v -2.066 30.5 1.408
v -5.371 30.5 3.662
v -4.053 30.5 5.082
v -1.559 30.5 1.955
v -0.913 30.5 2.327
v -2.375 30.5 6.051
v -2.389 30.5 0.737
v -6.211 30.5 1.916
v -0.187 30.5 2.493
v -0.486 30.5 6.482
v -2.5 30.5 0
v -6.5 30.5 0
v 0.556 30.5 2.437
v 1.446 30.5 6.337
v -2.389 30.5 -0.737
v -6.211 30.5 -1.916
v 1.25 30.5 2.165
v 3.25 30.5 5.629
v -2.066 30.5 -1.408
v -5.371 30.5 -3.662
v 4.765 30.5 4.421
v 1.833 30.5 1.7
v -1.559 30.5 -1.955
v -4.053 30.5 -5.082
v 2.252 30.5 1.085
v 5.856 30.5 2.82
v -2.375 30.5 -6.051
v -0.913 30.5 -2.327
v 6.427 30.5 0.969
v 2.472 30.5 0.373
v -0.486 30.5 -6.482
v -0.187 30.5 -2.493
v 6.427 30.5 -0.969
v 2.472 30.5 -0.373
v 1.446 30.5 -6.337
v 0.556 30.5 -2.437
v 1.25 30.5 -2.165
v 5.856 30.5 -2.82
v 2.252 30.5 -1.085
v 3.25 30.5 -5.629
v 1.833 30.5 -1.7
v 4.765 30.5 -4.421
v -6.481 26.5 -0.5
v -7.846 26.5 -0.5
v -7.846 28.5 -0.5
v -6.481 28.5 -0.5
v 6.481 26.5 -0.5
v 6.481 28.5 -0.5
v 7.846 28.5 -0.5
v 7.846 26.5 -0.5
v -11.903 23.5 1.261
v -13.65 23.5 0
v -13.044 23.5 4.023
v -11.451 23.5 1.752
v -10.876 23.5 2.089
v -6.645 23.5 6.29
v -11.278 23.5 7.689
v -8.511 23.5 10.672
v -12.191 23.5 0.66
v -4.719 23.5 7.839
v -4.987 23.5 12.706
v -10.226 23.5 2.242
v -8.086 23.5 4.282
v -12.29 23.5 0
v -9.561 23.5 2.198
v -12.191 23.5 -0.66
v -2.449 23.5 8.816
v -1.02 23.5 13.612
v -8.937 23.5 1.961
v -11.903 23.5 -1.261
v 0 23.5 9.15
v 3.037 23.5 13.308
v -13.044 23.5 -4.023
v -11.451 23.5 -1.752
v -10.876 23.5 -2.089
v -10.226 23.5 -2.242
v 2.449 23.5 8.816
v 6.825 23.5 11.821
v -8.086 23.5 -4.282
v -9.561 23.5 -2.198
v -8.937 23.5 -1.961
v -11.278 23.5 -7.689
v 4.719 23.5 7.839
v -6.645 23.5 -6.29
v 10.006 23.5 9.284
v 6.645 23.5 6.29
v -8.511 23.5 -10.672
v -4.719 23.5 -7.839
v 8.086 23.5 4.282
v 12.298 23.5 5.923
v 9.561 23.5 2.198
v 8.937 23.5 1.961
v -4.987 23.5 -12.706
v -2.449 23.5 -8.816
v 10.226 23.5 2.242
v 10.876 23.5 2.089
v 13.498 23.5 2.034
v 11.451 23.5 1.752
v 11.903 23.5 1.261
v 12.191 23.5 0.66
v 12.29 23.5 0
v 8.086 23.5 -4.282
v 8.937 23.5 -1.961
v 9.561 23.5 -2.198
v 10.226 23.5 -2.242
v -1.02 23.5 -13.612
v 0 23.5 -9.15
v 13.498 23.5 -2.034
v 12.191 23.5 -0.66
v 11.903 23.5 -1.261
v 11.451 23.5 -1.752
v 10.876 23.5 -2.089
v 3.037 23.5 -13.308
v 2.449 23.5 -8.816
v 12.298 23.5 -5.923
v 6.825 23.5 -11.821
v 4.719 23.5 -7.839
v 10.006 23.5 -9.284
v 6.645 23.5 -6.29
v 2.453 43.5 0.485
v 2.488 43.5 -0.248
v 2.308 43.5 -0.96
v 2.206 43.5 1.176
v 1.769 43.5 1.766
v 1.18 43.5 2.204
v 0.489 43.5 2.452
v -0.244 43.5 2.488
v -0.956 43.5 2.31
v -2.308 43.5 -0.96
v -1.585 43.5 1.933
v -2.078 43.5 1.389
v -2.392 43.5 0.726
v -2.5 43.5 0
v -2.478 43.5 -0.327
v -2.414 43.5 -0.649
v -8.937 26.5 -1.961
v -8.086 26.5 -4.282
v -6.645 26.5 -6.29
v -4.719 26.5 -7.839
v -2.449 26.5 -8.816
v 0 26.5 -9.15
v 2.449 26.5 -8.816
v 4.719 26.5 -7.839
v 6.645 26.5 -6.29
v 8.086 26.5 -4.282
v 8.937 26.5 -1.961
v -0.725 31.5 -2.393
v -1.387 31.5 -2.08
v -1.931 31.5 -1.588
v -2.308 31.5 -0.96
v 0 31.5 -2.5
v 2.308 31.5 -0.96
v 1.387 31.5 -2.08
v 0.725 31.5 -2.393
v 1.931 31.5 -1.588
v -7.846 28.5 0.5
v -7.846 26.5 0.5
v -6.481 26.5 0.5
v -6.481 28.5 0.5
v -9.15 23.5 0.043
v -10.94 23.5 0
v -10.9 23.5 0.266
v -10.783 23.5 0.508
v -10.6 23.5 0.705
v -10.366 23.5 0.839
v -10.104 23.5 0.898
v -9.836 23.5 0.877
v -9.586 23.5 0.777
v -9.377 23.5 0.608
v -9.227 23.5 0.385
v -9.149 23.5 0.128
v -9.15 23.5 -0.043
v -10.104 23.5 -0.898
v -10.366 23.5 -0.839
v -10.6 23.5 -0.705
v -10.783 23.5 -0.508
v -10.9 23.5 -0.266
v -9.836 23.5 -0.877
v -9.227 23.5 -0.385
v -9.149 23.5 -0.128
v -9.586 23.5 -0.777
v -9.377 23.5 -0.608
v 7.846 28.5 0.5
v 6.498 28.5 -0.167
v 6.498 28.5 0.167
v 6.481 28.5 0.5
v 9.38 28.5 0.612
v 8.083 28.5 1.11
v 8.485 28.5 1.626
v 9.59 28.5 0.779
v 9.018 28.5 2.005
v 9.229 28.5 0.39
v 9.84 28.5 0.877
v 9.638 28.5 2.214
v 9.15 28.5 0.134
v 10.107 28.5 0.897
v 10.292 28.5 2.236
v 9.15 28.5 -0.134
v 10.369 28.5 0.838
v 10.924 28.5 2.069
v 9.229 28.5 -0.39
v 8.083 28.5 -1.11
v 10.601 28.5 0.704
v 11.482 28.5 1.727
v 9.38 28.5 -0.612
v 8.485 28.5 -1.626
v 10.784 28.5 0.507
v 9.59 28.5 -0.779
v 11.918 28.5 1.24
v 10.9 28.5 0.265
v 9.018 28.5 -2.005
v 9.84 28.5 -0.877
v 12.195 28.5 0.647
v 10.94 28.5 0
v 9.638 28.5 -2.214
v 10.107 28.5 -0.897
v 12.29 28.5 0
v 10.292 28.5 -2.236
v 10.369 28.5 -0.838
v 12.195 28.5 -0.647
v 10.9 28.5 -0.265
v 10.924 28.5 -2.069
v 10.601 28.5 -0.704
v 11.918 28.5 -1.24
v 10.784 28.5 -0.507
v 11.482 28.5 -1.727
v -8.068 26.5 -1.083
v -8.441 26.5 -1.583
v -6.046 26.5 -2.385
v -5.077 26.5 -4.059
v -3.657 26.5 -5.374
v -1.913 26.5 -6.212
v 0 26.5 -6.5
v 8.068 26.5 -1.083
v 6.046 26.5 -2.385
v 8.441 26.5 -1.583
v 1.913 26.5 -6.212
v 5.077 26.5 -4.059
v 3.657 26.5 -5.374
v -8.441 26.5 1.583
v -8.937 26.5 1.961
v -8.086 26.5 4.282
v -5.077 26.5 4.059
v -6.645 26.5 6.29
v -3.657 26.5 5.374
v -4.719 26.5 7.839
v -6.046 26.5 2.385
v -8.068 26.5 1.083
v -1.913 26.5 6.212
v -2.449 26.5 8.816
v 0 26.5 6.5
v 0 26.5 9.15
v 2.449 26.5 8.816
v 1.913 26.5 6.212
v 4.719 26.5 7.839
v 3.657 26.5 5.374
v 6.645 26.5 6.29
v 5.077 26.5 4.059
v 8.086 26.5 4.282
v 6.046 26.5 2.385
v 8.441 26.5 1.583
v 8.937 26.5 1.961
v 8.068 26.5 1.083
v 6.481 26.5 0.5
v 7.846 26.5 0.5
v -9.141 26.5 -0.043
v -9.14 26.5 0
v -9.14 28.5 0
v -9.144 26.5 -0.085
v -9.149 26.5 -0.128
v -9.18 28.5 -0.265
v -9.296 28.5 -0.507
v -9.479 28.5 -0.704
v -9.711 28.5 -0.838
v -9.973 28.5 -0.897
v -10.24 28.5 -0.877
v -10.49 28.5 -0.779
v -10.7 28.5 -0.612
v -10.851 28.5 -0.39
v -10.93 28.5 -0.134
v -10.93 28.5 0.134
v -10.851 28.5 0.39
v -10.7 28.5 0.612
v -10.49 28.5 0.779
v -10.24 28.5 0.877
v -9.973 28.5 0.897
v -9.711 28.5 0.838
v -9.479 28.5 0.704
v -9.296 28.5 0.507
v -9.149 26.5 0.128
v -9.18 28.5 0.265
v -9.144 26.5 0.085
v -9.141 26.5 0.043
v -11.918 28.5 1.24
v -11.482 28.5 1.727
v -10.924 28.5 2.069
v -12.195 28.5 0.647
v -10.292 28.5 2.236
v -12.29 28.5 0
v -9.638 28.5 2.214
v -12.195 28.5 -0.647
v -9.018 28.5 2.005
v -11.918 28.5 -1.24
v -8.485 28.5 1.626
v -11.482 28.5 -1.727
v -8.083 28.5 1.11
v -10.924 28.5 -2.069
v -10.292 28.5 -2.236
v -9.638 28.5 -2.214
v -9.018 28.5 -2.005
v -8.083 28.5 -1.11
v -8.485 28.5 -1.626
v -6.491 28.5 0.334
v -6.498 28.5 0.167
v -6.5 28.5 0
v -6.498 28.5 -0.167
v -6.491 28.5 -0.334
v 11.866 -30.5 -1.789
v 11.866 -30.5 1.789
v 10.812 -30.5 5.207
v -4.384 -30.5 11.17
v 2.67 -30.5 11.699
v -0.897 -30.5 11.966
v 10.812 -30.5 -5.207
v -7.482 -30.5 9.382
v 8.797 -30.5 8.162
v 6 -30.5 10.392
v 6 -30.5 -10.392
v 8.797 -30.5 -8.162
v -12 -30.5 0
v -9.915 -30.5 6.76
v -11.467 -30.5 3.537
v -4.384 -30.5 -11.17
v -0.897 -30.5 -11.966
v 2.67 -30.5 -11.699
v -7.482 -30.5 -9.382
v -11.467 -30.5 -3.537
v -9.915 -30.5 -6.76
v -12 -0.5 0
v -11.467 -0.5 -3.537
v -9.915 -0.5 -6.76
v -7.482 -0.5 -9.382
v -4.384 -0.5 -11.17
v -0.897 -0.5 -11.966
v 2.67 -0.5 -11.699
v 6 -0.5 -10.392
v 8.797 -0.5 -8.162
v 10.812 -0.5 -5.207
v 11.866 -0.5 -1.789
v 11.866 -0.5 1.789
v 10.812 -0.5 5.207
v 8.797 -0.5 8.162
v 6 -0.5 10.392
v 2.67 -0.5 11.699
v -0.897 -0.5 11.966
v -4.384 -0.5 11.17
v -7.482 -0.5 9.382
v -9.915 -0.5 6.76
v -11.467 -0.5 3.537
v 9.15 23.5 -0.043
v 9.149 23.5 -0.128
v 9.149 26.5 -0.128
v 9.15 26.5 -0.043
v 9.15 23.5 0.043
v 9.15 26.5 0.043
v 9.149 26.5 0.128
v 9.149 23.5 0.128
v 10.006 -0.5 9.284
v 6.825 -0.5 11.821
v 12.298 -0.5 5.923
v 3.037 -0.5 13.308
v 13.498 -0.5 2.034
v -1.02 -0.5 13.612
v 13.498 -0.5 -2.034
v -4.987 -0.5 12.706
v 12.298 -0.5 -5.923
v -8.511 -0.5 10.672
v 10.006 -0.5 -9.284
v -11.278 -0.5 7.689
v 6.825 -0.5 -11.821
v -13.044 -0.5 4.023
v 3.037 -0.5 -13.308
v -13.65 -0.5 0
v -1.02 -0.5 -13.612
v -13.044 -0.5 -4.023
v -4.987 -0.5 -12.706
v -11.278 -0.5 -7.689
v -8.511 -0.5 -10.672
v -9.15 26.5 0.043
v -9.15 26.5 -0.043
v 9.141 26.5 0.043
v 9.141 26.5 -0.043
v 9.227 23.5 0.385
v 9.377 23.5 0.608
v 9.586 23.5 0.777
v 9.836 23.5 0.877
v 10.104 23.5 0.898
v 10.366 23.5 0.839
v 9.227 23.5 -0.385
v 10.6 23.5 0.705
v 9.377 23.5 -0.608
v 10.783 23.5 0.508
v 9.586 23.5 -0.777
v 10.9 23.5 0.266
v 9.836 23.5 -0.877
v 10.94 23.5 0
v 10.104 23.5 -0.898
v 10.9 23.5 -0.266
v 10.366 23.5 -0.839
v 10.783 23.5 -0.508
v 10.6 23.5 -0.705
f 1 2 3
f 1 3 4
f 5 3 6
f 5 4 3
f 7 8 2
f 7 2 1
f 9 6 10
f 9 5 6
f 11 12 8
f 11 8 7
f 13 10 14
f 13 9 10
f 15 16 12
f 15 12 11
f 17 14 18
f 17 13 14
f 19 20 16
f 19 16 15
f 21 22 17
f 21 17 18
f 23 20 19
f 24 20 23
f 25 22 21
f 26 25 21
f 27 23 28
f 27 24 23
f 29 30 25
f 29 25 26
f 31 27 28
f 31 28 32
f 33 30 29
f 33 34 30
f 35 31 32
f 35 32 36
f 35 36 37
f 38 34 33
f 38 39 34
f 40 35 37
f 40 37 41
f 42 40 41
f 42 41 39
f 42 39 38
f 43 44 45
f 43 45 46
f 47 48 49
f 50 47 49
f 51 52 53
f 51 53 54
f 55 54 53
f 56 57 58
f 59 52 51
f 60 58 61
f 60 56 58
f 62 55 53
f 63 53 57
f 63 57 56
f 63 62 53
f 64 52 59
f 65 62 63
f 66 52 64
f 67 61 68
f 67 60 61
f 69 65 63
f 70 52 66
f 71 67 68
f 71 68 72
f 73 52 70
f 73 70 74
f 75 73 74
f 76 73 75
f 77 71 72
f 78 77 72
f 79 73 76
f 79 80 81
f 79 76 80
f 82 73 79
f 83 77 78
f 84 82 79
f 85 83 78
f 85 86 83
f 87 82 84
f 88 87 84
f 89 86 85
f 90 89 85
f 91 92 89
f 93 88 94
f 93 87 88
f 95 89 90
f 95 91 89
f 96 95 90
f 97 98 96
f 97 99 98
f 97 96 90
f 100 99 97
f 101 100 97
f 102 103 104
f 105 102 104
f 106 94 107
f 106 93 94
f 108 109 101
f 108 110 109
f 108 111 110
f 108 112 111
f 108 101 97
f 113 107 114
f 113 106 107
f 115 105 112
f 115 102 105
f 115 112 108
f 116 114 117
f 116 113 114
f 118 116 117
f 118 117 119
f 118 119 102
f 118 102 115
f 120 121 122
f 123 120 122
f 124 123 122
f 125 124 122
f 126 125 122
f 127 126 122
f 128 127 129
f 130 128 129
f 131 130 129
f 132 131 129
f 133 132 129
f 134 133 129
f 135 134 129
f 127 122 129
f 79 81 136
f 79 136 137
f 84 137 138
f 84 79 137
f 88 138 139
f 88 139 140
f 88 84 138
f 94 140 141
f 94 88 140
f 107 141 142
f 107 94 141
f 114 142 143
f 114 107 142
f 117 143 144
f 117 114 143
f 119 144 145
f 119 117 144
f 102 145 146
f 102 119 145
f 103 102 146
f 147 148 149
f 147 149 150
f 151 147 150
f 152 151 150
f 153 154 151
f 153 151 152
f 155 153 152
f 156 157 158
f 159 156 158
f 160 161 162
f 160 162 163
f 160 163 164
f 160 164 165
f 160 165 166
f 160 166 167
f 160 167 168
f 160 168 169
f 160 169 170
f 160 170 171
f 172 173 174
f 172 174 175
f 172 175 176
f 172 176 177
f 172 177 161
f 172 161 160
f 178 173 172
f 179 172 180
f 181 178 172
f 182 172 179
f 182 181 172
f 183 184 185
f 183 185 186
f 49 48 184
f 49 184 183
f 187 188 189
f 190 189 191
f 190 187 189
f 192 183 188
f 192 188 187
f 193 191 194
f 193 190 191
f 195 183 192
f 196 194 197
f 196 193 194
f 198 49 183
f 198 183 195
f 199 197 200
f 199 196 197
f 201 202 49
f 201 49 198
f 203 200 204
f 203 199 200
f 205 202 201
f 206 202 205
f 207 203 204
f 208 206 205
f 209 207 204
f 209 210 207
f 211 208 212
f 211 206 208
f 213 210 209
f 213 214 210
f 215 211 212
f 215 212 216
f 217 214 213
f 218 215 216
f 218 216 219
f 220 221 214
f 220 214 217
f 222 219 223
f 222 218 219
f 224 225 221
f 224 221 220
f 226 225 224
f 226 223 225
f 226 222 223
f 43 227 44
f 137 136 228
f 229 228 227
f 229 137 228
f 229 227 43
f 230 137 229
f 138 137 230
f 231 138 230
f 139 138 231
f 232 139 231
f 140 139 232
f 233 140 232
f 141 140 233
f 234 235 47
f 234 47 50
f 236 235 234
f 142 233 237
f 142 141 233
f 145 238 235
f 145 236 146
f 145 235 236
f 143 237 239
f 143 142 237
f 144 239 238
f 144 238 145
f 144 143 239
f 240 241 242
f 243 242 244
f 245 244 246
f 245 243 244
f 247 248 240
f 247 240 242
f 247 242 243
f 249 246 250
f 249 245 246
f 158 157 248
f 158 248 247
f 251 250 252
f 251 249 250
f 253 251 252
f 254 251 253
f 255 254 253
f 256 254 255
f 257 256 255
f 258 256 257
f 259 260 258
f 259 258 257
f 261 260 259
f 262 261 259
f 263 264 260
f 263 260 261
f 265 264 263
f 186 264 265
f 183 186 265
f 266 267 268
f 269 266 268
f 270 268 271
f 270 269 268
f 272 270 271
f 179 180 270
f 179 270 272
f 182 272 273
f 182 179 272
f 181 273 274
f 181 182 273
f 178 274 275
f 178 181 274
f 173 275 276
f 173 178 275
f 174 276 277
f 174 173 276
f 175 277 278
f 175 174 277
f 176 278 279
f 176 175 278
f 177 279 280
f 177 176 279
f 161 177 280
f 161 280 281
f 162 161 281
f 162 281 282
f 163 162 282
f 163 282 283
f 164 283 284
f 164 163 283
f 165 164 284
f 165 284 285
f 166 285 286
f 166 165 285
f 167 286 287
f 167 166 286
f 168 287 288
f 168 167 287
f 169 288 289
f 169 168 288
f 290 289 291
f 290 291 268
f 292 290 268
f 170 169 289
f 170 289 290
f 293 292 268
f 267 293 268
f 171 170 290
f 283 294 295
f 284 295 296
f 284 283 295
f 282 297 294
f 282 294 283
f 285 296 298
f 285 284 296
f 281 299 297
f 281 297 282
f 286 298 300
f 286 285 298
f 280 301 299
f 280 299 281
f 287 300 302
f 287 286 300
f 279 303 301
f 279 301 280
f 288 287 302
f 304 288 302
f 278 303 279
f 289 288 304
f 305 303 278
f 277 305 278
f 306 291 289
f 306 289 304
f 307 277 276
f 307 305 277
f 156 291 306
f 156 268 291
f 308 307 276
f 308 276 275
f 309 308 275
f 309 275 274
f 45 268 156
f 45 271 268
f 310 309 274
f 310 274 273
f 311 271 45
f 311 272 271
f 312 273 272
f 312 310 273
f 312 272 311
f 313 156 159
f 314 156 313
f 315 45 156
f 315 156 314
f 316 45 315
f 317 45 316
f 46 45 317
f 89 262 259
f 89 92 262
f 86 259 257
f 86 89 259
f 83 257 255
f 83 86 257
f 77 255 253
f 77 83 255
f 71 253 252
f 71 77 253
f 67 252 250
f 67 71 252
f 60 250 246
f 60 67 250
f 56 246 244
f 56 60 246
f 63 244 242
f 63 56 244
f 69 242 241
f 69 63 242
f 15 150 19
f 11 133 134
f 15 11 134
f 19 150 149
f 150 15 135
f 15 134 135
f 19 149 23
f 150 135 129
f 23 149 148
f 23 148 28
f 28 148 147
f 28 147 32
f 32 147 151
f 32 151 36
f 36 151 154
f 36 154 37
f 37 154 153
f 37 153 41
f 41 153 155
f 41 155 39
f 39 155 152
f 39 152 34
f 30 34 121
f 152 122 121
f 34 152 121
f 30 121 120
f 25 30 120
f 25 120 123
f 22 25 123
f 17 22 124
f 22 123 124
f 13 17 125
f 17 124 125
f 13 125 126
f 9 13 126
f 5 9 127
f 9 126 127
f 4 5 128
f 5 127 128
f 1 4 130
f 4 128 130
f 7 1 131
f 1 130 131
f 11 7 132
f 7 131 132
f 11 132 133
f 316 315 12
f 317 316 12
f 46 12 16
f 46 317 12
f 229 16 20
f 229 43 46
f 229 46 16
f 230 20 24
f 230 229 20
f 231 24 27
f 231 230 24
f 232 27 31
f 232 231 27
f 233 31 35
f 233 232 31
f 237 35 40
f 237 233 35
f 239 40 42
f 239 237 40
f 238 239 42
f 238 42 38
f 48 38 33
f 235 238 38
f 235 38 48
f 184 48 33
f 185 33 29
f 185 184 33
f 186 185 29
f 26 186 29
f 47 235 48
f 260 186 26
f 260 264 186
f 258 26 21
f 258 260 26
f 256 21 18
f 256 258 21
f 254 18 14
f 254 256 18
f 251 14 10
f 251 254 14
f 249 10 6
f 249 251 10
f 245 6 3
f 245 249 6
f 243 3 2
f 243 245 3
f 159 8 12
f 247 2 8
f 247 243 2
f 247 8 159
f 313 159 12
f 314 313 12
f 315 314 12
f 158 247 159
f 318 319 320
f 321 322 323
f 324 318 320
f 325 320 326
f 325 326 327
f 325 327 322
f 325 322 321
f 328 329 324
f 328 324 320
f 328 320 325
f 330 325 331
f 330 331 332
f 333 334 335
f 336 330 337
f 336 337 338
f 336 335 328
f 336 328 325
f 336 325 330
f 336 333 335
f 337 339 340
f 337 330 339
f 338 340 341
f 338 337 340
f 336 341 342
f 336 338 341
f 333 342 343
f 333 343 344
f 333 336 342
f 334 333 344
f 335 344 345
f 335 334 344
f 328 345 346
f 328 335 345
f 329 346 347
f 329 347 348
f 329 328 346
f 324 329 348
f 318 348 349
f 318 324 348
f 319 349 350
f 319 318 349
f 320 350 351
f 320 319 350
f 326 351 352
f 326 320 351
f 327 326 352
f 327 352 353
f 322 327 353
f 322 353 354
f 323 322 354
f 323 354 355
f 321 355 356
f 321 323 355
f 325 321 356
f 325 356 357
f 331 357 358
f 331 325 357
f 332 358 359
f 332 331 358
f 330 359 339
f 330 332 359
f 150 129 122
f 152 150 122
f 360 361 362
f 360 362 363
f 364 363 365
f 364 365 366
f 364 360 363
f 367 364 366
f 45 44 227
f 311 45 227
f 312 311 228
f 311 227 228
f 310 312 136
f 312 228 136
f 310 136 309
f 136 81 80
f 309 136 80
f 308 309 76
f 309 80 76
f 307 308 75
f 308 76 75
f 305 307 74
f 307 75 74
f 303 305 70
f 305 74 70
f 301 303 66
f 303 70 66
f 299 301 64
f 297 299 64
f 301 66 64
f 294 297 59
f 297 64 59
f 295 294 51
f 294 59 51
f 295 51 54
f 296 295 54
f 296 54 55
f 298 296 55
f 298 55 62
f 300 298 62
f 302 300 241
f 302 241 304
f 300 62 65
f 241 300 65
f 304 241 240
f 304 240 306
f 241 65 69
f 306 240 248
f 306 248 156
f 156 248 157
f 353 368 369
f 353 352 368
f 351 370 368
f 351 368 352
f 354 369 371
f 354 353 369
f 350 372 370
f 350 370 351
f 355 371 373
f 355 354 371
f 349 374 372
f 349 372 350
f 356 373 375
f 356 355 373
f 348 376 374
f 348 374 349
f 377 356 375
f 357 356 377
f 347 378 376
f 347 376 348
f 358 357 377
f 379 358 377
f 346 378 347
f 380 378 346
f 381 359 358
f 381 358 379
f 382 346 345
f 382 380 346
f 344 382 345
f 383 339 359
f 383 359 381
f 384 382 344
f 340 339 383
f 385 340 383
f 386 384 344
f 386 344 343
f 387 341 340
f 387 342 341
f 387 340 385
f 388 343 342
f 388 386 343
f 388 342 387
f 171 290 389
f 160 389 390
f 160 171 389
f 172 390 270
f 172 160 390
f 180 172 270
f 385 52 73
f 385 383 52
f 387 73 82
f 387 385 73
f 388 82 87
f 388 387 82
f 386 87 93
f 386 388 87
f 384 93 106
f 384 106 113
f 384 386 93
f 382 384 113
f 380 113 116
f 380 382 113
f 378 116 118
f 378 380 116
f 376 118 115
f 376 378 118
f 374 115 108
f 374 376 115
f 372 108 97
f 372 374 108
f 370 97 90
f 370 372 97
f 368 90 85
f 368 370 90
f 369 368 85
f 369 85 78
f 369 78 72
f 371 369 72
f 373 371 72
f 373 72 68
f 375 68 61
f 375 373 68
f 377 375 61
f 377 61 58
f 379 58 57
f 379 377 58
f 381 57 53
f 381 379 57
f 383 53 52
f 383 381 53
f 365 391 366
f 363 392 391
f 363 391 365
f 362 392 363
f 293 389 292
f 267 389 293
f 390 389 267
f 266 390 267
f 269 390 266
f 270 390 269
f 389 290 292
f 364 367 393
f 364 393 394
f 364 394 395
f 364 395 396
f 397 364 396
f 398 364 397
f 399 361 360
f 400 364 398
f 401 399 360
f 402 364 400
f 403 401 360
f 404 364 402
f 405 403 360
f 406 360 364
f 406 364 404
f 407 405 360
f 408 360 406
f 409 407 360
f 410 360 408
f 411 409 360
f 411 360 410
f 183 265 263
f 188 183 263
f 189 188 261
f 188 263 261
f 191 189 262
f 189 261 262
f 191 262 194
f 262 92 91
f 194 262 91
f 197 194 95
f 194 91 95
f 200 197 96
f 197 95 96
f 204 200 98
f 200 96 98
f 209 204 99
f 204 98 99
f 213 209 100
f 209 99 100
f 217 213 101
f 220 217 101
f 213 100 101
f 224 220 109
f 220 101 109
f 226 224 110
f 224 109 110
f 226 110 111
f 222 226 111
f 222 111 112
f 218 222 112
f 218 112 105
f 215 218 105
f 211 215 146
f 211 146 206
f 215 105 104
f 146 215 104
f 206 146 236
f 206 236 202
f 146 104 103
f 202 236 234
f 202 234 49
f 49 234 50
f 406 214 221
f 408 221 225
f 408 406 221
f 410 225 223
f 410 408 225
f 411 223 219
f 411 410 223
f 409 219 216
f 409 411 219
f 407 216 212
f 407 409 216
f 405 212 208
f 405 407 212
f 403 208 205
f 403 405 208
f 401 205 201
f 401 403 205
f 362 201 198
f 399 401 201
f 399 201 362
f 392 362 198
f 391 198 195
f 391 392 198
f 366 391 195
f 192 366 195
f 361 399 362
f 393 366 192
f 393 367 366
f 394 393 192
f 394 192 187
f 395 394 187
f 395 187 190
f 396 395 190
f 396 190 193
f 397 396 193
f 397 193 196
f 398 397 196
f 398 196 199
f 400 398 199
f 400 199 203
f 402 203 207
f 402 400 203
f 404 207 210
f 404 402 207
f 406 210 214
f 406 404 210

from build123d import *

# Parameters (mm, degrees)
CROQUIS1_W              = 2.5
CROQUIS1_H              = 13
CORTAR_EXTRUIR1_DEPTH   = 12
CROQUIS4_R              = 2.25
CROQUIS4_R_2            = 0.9
CROQUIS4_W              = 18
CROQUIS4_H              = 1
SALIENTE_EXTRUIR1_DEPTH = 5


with BuildPart() as part:
    # Croquis1 → Revolución1 (revolve)
    with BuildSketch(Plane.XY):
        with Locations((-1.25, 37)):
            Rectangle(CROQUIS1_W, CROQUIS1_H)
        Polygon((-12, -30.5), (0, -30.5), (0, 30.5), (-6.5, 30.5), (-6.5, 26.5), (-9.15, 26.5), (-9.15, 23.5), (-13.65, 23.5), (-13.65, -0.5), (-12, -0.5), align=None)
    revolve(axis=Axis((0, 65.687156563, 0), (0, -1, 0)))

    # Croquis2 → Cortar-Extruir1 (cut)
    with BuildSketch(Plane(origin=(0, 43.5, 0), x_dir=(1, 0, 0), z_dir=(0, 1, 0))):
        Polygon((-55.580517034, 0.96), (-2.308332732, 0.96), (2.308332732, 0.96), (55.580517034, 0.96), (55.580517034, 107.504368605), (-55.580517034, 107.504368605), align=None)
    extrude(amount=-CORTAR_EXTRUIR1_DEPTH, mode=Mode.SUBTRACT)

    # Croquis4 → Saliente-Extruir1 (add)
    with BuildSketch(Plane(origin=(0, 23.5, 0), x_dir=(1, 0, 0), z_dir=(0, 1, 0))):
        with Locations((-10.04, 0)):
            Circle(CROQUIS4_R)
        with Locations((-10.04, 0)):
            Circle(CROQUIS4_R_2, mode=Mode.SUBTRACT)
        with Locations((10.04, 0)):
            Circle(CROQUIS4_R)
        with Locations((10.04, 0)):
            Circle(CROQUIS4_R_2, mode=Mode.SUBTRACT)
        Rectangle(CROQUIS4_W, CROQUIS4_H)
    extrude(amount=SALIENTE_EXTRUIR1_DEPTH)


solid = part.part
